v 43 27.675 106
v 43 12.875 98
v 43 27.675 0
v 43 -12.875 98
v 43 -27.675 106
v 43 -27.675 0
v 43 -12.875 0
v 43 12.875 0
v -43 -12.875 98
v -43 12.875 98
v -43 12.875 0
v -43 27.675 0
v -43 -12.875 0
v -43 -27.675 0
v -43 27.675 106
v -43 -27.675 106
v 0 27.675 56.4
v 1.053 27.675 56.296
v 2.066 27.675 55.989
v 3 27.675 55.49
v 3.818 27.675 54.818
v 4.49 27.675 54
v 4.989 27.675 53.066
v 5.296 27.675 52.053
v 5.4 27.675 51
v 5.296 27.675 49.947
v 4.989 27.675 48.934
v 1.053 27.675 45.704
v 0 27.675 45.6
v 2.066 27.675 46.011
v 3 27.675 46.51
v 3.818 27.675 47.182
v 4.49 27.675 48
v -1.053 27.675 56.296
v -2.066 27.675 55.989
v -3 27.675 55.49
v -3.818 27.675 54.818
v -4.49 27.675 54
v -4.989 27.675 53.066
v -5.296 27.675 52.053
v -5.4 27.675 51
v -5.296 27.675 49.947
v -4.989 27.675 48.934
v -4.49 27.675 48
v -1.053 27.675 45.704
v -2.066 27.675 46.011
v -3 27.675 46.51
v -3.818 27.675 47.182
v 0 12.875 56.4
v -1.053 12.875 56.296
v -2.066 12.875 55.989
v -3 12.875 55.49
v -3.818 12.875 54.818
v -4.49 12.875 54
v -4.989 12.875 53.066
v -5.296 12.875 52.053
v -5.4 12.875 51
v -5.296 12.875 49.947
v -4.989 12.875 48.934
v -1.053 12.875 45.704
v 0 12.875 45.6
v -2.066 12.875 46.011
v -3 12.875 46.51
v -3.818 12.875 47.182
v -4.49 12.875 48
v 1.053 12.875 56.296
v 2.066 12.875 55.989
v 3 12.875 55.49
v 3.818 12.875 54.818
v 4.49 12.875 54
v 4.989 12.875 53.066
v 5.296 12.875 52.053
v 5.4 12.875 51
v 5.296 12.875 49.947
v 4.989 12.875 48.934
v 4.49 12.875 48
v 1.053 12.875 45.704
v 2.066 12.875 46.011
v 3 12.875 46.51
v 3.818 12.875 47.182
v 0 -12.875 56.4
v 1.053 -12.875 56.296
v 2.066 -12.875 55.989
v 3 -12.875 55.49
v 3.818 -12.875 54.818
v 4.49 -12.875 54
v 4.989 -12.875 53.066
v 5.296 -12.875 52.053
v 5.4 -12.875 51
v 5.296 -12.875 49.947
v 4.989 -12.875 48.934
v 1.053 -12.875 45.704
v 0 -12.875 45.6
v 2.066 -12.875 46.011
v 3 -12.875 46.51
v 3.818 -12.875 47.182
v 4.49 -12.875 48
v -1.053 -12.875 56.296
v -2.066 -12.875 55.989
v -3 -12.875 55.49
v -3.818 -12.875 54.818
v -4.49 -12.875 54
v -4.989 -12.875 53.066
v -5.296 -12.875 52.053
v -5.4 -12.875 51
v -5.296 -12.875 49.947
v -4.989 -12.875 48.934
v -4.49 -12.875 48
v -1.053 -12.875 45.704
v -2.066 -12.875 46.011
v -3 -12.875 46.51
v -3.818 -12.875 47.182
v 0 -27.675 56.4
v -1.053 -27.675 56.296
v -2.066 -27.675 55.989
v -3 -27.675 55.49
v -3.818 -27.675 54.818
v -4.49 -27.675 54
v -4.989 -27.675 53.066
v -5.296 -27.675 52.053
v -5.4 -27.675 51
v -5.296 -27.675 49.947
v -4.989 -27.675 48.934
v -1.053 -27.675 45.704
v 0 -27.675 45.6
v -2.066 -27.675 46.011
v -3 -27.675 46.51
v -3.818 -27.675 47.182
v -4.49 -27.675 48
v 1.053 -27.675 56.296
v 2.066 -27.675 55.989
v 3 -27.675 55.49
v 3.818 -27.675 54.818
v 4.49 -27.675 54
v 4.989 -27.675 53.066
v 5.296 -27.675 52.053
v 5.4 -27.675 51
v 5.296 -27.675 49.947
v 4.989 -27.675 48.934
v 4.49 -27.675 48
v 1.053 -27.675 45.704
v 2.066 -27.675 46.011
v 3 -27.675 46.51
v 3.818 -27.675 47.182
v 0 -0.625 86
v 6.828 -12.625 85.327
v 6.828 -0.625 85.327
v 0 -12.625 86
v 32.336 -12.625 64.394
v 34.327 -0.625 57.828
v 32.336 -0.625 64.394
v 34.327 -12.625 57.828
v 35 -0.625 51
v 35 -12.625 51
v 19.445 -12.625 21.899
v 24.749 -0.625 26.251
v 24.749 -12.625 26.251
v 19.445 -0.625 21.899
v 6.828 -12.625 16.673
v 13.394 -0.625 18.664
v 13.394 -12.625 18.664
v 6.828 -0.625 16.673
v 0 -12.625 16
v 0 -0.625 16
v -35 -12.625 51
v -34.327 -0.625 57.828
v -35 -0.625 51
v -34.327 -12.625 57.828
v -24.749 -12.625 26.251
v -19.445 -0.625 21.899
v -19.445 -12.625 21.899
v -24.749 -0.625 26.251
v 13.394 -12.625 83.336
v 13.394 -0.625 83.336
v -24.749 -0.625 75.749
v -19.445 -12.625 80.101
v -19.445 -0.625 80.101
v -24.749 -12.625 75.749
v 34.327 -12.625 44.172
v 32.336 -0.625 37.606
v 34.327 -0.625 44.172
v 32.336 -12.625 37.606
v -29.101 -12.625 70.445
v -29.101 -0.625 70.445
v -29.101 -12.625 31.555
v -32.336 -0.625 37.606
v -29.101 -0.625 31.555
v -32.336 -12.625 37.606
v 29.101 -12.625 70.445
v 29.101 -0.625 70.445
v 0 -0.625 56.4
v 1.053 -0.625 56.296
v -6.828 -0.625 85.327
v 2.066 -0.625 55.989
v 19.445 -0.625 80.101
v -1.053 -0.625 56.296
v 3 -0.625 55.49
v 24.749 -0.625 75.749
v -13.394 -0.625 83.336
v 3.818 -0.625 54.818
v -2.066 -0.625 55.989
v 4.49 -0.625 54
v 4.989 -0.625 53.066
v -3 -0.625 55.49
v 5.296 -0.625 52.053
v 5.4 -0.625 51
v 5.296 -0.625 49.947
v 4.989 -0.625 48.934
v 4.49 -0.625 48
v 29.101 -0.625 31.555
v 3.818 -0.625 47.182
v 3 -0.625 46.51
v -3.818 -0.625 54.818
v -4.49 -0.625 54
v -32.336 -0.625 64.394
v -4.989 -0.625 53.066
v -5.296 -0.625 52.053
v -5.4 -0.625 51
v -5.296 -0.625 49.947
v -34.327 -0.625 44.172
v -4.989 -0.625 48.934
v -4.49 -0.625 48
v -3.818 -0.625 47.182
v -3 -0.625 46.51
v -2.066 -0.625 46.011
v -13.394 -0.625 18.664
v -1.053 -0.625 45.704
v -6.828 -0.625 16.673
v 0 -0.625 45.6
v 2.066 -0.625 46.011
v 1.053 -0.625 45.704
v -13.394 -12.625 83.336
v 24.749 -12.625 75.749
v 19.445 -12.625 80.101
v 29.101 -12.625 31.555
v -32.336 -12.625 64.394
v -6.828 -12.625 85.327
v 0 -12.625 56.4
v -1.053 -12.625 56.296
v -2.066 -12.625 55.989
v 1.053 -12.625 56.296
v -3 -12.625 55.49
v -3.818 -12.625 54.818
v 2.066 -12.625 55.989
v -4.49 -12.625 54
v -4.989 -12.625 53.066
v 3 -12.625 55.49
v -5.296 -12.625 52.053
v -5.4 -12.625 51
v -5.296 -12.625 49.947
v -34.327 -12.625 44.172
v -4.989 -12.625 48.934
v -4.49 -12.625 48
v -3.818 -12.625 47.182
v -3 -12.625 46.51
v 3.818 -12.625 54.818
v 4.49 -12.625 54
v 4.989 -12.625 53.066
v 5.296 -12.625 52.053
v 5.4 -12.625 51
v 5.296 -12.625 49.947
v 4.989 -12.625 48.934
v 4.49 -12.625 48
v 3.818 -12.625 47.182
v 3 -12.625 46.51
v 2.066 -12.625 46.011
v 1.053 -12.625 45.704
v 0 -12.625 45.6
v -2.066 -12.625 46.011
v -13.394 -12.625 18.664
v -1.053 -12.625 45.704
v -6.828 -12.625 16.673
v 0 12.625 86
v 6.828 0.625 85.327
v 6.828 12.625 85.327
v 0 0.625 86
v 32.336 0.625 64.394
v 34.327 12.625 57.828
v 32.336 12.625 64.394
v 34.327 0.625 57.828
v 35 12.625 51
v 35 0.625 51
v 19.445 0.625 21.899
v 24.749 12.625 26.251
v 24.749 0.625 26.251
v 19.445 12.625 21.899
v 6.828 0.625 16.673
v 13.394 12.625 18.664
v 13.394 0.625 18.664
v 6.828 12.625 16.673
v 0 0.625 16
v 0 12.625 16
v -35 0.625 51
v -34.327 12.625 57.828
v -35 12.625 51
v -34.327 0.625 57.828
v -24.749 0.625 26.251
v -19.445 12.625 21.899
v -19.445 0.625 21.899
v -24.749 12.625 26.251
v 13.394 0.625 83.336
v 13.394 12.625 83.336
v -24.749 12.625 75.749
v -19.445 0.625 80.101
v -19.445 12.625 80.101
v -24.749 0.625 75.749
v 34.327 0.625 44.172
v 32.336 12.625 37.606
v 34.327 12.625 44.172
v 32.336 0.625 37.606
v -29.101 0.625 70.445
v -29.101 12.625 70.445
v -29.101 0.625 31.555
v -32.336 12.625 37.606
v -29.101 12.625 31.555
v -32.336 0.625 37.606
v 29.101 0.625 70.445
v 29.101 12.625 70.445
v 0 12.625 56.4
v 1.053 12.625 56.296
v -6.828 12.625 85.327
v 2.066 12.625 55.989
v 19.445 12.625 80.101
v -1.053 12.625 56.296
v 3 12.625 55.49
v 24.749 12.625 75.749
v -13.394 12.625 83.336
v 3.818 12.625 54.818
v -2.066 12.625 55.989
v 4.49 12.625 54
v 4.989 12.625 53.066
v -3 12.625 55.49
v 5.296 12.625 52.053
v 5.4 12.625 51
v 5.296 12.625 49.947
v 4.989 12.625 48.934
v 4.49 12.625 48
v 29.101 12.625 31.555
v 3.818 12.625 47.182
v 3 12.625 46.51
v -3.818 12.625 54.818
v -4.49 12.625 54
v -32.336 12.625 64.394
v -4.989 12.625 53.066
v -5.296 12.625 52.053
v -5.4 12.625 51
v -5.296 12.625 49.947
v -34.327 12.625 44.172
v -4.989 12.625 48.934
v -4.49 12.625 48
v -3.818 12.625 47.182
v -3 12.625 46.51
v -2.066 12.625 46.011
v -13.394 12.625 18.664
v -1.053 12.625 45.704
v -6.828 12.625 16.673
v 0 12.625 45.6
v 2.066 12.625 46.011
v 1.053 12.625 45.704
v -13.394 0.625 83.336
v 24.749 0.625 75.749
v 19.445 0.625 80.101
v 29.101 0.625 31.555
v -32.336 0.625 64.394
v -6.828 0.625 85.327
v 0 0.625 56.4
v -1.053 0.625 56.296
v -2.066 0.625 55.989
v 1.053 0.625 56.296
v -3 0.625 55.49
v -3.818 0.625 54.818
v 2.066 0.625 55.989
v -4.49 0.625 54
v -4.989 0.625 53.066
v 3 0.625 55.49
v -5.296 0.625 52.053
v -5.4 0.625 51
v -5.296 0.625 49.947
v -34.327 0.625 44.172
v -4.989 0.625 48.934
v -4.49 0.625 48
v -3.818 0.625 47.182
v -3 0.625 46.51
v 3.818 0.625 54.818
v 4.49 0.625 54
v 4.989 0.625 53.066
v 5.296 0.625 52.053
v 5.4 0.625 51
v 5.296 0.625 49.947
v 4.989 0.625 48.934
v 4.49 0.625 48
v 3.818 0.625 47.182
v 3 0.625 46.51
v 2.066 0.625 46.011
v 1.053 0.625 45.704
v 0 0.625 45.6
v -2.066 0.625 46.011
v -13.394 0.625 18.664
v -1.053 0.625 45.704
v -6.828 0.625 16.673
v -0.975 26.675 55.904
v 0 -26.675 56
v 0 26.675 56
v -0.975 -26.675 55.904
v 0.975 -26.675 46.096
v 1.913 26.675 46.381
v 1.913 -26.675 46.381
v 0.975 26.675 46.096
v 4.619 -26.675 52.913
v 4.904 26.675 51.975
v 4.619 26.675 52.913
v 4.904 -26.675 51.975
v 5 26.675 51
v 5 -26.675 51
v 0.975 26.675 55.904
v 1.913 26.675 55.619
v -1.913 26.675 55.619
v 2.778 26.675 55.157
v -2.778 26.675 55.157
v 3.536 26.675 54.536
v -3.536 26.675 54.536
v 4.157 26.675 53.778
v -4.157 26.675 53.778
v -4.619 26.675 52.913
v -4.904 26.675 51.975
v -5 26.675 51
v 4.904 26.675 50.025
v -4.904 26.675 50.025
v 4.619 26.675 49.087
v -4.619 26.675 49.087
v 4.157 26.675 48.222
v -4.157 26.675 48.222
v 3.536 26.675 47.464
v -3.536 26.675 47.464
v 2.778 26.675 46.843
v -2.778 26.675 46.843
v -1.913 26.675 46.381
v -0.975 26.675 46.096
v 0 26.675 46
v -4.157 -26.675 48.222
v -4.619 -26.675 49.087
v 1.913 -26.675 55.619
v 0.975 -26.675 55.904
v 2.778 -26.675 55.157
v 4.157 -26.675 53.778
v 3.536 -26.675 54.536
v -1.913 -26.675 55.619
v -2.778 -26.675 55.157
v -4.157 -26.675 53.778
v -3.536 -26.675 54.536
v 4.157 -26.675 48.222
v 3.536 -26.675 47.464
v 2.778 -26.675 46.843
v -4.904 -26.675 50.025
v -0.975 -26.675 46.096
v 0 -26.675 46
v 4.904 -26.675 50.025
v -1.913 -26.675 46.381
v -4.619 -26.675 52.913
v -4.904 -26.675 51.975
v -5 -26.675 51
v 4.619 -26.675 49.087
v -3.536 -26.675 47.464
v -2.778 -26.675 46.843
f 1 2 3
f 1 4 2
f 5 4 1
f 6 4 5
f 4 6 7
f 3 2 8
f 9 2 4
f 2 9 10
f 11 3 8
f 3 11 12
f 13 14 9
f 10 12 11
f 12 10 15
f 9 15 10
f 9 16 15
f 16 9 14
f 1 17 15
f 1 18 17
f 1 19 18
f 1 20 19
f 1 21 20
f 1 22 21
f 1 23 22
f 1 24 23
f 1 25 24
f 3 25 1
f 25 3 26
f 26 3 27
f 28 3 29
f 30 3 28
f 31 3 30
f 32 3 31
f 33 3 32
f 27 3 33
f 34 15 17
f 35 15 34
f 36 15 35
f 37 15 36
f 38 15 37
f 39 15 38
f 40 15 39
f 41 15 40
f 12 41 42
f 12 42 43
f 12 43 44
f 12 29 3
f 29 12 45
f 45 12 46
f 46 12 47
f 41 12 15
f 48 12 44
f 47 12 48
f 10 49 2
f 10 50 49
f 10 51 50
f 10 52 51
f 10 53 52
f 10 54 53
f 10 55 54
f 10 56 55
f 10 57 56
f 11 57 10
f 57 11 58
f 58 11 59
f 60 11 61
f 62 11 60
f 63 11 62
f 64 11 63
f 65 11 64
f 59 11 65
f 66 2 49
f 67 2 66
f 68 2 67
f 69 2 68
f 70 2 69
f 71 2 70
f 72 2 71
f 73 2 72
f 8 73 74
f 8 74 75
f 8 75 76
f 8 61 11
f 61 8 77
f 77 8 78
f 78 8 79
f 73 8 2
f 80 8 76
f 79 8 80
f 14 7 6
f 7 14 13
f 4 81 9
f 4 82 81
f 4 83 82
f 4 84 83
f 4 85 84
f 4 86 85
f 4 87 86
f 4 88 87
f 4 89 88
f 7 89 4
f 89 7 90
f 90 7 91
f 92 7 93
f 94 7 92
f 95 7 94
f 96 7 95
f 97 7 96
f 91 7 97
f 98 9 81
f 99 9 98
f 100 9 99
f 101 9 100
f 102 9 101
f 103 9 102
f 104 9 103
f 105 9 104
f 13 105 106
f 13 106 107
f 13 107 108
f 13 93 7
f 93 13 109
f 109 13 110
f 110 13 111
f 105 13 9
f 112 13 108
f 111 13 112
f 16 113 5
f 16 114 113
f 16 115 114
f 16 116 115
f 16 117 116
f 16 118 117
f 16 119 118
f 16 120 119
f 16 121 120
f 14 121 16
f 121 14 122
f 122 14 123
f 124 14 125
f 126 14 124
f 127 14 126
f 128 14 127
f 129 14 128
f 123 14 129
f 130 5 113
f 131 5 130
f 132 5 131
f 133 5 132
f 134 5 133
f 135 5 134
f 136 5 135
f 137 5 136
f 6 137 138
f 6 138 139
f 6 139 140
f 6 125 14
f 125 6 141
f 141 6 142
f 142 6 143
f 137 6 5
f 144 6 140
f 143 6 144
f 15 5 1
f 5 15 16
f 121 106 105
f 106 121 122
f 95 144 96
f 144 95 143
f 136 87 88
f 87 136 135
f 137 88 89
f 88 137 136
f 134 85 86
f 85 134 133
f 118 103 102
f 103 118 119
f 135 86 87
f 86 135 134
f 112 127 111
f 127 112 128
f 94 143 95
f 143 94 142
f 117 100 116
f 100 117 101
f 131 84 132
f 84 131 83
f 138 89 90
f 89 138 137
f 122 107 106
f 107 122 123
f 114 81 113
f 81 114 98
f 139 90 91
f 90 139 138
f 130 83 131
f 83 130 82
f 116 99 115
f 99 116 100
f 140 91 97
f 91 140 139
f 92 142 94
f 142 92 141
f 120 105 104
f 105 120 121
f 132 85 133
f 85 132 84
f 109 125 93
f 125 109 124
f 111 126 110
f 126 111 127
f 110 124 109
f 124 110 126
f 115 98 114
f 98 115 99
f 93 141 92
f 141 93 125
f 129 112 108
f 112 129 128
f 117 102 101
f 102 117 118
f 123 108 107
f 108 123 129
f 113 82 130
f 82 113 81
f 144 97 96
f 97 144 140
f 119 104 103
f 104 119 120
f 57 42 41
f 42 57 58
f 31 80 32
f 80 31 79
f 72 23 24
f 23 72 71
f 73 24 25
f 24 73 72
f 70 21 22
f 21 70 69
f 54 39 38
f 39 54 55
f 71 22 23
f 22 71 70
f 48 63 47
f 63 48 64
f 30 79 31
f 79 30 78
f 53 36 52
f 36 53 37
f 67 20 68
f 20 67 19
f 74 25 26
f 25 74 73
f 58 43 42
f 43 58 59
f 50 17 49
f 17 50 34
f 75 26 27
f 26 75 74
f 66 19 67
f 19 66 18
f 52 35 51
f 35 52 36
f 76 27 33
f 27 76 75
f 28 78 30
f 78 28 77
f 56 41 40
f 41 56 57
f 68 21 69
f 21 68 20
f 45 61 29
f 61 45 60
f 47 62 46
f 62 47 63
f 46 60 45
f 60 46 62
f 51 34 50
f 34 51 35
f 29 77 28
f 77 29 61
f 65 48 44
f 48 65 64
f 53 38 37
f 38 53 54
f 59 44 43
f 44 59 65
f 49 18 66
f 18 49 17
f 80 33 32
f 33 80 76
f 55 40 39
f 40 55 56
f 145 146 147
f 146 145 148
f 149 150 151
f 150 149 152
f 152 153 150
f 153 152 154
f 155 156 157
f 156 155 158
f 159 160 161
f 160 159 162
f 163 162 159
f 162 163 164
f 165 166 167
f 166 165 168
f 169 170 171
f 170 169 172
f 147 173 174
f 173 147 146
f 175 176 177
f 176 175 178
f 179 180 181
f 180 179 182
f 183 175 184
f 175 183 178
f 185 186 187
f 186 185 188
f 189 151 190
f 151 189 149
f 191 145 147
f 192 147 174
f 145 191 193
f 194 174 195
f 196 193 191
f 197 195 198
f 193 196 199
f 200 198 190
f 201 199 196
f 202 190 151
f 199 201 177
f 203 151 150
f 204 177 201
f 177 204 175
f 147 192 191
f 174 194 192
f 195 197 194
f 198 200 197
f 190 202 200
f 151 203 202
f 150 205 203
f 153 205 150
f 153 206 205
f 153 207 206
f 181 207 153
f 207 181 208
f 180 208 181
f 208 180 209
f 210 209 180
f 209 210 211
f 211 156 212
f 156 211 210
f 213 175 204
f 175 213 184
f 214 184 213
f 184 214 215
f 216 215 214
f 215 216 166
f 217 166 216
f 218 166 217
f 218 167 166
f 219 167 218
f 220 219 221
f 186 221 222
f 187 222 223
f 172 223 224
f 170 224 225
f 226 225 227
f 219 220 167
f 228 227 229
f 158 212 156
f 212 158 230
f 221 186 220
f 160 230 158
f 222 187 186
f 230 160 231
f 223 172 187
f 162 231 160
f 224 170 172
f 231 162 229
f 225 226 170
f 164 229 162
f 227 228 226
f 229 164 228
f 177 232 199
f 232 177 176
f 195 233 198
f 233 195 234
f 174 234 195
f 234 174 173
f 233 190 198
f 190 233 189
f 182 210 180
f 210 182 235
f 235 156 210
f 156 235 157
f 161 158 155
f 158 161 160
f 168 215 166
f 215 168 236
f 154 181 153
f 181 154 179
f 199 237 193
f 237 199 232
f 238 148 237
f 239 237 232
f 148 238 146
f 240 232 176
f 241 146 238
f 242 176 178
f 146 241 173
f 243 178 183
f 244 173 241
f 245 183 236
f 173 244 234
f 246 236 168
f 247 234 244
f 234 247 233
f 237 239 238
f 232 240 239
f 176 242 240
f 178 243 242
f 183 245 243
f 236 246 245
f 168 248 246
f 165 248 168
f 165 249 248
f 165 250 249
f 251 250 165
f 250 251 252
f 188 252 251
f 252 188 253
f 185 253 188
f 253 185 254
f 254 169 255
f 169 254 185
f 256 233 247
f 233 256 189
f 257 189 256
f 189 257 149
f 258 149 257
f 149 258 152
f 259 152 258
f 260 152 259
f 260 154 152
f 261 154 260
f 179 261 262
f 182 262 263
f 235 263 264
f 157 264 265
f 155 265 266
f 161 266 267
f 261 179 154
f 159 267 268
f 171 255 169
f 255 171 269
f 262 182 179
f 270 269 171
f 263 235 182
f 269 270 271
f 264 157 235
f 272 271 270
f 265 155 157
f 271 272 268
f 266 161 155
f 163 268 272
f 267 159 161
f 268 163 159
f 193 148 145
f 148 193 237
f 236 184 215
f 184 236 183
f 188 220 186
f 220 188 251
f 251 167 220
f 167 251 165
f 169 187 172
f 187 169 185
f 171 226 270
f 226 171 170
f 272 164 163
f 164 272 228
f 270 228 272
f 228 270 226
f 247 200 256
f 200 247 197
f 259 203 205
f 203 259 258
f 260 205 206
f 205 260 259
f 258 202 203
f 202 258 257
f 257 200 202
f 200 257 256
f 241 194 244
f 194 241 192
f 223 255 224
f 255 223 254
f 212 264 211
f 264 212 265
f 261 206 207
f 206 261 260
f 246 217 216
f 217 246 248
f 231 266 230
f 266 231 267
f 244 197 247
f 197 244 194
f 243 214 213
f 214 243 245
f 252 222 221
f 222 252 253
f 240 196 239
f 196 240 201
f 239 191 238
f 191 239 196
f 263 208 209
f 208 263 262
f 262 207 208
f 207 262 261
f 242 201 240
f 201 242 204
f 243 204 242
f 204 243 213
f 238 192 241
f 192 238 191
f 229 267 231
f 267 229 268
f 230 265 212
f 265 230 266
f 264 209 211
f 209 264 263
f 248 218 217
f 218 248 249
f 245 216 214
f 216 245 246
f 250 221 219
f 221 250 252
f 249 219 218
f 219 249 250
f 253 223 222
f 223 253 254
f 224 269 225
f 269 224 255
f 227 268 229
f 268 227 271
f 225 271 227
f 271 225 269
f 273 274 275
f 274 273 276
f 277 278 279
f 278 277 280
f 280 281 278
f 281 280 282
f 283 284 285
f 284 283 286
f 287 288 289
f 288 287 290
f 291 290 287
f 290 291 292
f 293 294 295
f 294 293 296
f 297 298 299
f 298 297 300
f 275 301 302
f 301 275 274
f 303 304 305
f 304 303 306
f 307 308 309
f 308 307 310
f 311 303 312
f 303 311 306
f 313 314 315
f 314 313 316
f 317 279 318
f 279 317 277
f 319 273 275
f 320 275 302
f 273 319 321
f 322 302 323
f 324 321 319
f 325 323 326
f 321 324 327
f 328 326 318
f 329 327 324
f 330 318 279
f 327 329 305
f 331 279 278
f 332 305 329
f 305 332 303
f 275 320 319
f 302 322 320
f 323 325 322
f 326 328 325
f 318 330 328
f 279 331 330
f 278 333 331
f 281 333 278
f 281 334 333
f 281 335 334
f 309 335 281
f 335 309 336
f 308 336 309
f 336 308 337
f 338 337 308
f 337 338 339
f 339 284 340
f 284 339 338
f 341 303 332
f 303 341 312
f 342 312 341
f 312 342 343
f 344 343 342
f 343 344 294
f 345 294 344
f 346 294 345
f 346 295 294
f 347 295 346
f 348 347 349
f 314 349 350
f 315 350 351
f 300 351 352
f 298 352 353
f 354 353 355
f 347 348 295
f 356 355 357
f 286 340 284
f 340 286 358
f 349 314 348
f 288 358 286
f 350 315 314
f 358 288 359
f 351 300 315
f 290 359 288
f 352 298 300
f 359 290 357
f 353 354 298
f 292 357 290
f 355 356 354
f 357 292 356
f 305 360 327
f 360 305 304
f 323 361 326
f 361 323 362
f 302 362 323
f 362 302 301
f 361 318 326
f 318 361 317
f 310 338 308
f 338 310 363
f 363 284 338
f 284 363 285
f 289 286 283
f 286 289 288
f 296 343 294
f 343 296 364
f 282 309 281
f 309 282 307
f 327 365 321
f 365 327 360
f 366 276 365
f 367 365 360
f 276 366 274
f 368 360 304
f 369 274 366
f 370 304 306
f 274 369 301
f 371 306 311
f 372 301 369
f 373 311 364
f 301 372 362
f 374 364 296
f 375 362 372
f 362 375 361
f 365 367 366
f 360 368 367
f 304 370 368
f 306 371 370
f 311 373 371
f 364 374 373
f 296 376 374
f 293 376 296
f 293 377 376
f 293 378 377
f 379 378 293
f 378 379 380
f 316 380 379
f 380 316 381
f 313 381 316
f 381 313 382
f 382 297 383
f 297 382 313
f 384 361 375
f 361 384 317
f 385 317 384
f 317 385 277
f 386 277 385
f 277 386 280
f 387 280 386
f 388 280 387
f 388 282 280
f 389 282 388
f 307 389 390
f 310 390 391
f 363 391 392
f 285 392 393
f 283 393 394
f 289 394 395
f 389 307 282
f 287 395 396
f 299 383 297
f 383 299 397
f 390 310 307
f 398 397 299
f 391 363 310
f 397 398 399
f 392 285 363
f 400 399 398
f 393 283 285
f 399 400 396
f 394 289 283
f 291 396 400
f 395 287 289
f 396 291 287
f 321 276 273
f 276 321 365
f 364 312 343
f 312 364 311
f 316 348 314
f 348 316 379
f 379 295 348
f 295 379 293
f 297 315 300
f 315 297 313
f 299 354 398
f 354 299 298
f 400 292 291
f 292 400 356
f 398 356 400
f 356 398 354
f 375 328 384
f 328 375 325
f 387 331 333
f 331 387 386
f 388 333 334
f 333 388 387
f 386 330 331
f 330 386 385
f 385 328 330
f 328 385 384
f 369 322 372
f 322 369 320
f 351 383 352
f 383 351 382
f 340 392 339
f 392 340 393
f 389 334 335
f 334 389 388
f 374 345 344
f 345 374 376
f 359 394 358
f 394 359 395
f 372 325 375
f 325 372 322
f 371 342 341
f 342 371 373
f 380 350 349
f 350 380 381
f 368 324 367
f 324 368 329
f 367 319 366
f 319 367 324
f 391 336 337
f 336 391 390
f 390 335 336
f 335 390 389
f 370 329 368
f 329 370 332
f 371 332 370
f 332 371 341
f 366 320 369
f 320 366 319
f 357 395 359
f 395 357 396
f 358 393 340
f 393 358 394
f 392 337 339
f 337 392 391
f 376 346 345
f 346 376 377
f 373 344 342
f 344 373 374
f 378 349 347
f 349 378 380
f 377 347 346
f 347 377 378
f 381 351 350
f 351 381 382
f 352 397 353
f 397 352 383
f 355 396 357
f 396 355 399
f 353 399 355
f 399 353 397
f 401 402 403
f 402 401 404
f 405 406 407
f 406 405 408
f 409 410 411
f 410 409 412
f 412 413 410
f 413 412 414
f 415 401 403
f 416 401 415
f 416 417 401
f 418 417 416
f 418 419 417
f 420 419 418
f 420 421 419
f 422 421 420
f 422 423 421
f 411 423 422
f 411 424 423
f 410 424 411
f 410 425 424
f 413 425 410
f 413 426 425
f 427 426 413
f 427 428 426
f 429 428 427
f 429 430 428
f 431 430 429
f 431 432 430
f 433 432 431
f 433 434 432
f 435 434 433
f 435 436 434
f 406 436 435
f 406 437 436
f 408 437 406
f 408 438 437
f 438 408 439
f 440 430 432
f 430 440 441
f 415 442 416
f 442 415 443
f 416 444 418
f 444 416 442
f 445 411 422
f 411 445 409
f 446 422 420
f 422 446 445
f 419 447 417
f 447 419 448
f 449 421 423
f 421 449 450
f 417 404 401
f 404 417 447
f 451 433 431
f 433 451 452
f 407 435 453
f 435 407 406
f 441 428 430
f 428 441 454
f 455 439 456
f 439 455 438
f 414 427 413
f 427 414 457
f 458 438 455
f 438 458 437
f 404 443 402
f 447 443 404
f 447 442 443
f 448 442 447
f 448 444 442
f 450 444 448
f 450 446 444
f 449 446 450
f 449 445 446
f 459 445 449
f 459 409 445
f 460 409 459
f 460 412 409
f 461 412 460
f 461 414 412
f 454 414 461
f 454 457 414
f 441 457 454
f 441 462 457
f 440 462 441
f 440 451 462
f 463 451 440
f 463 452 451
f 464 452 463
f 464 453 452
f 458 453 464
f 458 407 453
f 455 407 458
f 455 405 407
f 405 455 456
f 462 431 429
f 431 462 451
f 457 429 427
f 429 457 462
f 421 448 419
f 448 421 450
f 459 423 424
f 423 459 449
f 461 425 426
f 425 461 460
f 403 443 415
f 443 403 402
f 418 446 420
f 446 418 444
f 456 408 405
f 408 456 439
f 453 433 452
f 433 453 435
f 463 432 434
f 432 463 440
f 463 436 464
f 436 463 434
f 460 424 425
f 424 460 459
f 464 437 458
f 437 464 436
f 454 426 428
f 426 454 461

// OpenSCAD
$fn = 32;

// ------------------------------------------------------------------------
// Trolley wheel set: wheels d70, fork 98 mm tall
// Every part is its own module, assembly() places every instance.
// ------------------------------------------------------------------------

// --- part 1 ---
module trolley_fork() {
  difference() {
    union() {
      translate([-43, 12.875, 0]) cube([86, 14.8, 98]);
      translate([-43, -27.675, 0]) cube([86, 14.8, 98]);
      translate([-43, -27.675, 98]) cube([86, 55.35, 8]);
    }
    translate([0, -20.275, 51]) rotate([90, 0, 0]) cylinder(h = 16.8, d = 10.8, center = true);
    translate([0, 20.275, 51]) rotate([90, 0, 0]) cylinder(h = 16.8, d = 10.8, center = true);
  }
}

// --- part 2 ---
module trolley_wheel() {
  difference() {
      translate([0, 0, 0]) cylinder(h = 12, d = 70);
      translate([0, 0, -1]) cylinder(h = 14, d = 10.8);
    }
}

// --- part 3 ---
module trolley_axle() {
  translate([0, 0, -26.675]) cylinder(h = 53.35, d = 10);
}

// --- assembly ---
module assembly() {
  color([0.80, 0.24, 0.20]) translate([0, 0, 0]) rotate([0, 0, 0]) trolley_fork();
  color([0.20, 0.45, 0.75]) translate([0, -0.625, 51]) rotate([90, 0, 0]) trolley_wheel();
  color([0.25, 0.62, 0.32]) translate([0, 12.625, 51]) rotate([90, 0, 0]) trolley_wheel();
  color([0.92, 0.70, 0.18]) translate([0, 0, 51]) rotate([90, 0, 0]) trolley_axle();
}

assembly();
